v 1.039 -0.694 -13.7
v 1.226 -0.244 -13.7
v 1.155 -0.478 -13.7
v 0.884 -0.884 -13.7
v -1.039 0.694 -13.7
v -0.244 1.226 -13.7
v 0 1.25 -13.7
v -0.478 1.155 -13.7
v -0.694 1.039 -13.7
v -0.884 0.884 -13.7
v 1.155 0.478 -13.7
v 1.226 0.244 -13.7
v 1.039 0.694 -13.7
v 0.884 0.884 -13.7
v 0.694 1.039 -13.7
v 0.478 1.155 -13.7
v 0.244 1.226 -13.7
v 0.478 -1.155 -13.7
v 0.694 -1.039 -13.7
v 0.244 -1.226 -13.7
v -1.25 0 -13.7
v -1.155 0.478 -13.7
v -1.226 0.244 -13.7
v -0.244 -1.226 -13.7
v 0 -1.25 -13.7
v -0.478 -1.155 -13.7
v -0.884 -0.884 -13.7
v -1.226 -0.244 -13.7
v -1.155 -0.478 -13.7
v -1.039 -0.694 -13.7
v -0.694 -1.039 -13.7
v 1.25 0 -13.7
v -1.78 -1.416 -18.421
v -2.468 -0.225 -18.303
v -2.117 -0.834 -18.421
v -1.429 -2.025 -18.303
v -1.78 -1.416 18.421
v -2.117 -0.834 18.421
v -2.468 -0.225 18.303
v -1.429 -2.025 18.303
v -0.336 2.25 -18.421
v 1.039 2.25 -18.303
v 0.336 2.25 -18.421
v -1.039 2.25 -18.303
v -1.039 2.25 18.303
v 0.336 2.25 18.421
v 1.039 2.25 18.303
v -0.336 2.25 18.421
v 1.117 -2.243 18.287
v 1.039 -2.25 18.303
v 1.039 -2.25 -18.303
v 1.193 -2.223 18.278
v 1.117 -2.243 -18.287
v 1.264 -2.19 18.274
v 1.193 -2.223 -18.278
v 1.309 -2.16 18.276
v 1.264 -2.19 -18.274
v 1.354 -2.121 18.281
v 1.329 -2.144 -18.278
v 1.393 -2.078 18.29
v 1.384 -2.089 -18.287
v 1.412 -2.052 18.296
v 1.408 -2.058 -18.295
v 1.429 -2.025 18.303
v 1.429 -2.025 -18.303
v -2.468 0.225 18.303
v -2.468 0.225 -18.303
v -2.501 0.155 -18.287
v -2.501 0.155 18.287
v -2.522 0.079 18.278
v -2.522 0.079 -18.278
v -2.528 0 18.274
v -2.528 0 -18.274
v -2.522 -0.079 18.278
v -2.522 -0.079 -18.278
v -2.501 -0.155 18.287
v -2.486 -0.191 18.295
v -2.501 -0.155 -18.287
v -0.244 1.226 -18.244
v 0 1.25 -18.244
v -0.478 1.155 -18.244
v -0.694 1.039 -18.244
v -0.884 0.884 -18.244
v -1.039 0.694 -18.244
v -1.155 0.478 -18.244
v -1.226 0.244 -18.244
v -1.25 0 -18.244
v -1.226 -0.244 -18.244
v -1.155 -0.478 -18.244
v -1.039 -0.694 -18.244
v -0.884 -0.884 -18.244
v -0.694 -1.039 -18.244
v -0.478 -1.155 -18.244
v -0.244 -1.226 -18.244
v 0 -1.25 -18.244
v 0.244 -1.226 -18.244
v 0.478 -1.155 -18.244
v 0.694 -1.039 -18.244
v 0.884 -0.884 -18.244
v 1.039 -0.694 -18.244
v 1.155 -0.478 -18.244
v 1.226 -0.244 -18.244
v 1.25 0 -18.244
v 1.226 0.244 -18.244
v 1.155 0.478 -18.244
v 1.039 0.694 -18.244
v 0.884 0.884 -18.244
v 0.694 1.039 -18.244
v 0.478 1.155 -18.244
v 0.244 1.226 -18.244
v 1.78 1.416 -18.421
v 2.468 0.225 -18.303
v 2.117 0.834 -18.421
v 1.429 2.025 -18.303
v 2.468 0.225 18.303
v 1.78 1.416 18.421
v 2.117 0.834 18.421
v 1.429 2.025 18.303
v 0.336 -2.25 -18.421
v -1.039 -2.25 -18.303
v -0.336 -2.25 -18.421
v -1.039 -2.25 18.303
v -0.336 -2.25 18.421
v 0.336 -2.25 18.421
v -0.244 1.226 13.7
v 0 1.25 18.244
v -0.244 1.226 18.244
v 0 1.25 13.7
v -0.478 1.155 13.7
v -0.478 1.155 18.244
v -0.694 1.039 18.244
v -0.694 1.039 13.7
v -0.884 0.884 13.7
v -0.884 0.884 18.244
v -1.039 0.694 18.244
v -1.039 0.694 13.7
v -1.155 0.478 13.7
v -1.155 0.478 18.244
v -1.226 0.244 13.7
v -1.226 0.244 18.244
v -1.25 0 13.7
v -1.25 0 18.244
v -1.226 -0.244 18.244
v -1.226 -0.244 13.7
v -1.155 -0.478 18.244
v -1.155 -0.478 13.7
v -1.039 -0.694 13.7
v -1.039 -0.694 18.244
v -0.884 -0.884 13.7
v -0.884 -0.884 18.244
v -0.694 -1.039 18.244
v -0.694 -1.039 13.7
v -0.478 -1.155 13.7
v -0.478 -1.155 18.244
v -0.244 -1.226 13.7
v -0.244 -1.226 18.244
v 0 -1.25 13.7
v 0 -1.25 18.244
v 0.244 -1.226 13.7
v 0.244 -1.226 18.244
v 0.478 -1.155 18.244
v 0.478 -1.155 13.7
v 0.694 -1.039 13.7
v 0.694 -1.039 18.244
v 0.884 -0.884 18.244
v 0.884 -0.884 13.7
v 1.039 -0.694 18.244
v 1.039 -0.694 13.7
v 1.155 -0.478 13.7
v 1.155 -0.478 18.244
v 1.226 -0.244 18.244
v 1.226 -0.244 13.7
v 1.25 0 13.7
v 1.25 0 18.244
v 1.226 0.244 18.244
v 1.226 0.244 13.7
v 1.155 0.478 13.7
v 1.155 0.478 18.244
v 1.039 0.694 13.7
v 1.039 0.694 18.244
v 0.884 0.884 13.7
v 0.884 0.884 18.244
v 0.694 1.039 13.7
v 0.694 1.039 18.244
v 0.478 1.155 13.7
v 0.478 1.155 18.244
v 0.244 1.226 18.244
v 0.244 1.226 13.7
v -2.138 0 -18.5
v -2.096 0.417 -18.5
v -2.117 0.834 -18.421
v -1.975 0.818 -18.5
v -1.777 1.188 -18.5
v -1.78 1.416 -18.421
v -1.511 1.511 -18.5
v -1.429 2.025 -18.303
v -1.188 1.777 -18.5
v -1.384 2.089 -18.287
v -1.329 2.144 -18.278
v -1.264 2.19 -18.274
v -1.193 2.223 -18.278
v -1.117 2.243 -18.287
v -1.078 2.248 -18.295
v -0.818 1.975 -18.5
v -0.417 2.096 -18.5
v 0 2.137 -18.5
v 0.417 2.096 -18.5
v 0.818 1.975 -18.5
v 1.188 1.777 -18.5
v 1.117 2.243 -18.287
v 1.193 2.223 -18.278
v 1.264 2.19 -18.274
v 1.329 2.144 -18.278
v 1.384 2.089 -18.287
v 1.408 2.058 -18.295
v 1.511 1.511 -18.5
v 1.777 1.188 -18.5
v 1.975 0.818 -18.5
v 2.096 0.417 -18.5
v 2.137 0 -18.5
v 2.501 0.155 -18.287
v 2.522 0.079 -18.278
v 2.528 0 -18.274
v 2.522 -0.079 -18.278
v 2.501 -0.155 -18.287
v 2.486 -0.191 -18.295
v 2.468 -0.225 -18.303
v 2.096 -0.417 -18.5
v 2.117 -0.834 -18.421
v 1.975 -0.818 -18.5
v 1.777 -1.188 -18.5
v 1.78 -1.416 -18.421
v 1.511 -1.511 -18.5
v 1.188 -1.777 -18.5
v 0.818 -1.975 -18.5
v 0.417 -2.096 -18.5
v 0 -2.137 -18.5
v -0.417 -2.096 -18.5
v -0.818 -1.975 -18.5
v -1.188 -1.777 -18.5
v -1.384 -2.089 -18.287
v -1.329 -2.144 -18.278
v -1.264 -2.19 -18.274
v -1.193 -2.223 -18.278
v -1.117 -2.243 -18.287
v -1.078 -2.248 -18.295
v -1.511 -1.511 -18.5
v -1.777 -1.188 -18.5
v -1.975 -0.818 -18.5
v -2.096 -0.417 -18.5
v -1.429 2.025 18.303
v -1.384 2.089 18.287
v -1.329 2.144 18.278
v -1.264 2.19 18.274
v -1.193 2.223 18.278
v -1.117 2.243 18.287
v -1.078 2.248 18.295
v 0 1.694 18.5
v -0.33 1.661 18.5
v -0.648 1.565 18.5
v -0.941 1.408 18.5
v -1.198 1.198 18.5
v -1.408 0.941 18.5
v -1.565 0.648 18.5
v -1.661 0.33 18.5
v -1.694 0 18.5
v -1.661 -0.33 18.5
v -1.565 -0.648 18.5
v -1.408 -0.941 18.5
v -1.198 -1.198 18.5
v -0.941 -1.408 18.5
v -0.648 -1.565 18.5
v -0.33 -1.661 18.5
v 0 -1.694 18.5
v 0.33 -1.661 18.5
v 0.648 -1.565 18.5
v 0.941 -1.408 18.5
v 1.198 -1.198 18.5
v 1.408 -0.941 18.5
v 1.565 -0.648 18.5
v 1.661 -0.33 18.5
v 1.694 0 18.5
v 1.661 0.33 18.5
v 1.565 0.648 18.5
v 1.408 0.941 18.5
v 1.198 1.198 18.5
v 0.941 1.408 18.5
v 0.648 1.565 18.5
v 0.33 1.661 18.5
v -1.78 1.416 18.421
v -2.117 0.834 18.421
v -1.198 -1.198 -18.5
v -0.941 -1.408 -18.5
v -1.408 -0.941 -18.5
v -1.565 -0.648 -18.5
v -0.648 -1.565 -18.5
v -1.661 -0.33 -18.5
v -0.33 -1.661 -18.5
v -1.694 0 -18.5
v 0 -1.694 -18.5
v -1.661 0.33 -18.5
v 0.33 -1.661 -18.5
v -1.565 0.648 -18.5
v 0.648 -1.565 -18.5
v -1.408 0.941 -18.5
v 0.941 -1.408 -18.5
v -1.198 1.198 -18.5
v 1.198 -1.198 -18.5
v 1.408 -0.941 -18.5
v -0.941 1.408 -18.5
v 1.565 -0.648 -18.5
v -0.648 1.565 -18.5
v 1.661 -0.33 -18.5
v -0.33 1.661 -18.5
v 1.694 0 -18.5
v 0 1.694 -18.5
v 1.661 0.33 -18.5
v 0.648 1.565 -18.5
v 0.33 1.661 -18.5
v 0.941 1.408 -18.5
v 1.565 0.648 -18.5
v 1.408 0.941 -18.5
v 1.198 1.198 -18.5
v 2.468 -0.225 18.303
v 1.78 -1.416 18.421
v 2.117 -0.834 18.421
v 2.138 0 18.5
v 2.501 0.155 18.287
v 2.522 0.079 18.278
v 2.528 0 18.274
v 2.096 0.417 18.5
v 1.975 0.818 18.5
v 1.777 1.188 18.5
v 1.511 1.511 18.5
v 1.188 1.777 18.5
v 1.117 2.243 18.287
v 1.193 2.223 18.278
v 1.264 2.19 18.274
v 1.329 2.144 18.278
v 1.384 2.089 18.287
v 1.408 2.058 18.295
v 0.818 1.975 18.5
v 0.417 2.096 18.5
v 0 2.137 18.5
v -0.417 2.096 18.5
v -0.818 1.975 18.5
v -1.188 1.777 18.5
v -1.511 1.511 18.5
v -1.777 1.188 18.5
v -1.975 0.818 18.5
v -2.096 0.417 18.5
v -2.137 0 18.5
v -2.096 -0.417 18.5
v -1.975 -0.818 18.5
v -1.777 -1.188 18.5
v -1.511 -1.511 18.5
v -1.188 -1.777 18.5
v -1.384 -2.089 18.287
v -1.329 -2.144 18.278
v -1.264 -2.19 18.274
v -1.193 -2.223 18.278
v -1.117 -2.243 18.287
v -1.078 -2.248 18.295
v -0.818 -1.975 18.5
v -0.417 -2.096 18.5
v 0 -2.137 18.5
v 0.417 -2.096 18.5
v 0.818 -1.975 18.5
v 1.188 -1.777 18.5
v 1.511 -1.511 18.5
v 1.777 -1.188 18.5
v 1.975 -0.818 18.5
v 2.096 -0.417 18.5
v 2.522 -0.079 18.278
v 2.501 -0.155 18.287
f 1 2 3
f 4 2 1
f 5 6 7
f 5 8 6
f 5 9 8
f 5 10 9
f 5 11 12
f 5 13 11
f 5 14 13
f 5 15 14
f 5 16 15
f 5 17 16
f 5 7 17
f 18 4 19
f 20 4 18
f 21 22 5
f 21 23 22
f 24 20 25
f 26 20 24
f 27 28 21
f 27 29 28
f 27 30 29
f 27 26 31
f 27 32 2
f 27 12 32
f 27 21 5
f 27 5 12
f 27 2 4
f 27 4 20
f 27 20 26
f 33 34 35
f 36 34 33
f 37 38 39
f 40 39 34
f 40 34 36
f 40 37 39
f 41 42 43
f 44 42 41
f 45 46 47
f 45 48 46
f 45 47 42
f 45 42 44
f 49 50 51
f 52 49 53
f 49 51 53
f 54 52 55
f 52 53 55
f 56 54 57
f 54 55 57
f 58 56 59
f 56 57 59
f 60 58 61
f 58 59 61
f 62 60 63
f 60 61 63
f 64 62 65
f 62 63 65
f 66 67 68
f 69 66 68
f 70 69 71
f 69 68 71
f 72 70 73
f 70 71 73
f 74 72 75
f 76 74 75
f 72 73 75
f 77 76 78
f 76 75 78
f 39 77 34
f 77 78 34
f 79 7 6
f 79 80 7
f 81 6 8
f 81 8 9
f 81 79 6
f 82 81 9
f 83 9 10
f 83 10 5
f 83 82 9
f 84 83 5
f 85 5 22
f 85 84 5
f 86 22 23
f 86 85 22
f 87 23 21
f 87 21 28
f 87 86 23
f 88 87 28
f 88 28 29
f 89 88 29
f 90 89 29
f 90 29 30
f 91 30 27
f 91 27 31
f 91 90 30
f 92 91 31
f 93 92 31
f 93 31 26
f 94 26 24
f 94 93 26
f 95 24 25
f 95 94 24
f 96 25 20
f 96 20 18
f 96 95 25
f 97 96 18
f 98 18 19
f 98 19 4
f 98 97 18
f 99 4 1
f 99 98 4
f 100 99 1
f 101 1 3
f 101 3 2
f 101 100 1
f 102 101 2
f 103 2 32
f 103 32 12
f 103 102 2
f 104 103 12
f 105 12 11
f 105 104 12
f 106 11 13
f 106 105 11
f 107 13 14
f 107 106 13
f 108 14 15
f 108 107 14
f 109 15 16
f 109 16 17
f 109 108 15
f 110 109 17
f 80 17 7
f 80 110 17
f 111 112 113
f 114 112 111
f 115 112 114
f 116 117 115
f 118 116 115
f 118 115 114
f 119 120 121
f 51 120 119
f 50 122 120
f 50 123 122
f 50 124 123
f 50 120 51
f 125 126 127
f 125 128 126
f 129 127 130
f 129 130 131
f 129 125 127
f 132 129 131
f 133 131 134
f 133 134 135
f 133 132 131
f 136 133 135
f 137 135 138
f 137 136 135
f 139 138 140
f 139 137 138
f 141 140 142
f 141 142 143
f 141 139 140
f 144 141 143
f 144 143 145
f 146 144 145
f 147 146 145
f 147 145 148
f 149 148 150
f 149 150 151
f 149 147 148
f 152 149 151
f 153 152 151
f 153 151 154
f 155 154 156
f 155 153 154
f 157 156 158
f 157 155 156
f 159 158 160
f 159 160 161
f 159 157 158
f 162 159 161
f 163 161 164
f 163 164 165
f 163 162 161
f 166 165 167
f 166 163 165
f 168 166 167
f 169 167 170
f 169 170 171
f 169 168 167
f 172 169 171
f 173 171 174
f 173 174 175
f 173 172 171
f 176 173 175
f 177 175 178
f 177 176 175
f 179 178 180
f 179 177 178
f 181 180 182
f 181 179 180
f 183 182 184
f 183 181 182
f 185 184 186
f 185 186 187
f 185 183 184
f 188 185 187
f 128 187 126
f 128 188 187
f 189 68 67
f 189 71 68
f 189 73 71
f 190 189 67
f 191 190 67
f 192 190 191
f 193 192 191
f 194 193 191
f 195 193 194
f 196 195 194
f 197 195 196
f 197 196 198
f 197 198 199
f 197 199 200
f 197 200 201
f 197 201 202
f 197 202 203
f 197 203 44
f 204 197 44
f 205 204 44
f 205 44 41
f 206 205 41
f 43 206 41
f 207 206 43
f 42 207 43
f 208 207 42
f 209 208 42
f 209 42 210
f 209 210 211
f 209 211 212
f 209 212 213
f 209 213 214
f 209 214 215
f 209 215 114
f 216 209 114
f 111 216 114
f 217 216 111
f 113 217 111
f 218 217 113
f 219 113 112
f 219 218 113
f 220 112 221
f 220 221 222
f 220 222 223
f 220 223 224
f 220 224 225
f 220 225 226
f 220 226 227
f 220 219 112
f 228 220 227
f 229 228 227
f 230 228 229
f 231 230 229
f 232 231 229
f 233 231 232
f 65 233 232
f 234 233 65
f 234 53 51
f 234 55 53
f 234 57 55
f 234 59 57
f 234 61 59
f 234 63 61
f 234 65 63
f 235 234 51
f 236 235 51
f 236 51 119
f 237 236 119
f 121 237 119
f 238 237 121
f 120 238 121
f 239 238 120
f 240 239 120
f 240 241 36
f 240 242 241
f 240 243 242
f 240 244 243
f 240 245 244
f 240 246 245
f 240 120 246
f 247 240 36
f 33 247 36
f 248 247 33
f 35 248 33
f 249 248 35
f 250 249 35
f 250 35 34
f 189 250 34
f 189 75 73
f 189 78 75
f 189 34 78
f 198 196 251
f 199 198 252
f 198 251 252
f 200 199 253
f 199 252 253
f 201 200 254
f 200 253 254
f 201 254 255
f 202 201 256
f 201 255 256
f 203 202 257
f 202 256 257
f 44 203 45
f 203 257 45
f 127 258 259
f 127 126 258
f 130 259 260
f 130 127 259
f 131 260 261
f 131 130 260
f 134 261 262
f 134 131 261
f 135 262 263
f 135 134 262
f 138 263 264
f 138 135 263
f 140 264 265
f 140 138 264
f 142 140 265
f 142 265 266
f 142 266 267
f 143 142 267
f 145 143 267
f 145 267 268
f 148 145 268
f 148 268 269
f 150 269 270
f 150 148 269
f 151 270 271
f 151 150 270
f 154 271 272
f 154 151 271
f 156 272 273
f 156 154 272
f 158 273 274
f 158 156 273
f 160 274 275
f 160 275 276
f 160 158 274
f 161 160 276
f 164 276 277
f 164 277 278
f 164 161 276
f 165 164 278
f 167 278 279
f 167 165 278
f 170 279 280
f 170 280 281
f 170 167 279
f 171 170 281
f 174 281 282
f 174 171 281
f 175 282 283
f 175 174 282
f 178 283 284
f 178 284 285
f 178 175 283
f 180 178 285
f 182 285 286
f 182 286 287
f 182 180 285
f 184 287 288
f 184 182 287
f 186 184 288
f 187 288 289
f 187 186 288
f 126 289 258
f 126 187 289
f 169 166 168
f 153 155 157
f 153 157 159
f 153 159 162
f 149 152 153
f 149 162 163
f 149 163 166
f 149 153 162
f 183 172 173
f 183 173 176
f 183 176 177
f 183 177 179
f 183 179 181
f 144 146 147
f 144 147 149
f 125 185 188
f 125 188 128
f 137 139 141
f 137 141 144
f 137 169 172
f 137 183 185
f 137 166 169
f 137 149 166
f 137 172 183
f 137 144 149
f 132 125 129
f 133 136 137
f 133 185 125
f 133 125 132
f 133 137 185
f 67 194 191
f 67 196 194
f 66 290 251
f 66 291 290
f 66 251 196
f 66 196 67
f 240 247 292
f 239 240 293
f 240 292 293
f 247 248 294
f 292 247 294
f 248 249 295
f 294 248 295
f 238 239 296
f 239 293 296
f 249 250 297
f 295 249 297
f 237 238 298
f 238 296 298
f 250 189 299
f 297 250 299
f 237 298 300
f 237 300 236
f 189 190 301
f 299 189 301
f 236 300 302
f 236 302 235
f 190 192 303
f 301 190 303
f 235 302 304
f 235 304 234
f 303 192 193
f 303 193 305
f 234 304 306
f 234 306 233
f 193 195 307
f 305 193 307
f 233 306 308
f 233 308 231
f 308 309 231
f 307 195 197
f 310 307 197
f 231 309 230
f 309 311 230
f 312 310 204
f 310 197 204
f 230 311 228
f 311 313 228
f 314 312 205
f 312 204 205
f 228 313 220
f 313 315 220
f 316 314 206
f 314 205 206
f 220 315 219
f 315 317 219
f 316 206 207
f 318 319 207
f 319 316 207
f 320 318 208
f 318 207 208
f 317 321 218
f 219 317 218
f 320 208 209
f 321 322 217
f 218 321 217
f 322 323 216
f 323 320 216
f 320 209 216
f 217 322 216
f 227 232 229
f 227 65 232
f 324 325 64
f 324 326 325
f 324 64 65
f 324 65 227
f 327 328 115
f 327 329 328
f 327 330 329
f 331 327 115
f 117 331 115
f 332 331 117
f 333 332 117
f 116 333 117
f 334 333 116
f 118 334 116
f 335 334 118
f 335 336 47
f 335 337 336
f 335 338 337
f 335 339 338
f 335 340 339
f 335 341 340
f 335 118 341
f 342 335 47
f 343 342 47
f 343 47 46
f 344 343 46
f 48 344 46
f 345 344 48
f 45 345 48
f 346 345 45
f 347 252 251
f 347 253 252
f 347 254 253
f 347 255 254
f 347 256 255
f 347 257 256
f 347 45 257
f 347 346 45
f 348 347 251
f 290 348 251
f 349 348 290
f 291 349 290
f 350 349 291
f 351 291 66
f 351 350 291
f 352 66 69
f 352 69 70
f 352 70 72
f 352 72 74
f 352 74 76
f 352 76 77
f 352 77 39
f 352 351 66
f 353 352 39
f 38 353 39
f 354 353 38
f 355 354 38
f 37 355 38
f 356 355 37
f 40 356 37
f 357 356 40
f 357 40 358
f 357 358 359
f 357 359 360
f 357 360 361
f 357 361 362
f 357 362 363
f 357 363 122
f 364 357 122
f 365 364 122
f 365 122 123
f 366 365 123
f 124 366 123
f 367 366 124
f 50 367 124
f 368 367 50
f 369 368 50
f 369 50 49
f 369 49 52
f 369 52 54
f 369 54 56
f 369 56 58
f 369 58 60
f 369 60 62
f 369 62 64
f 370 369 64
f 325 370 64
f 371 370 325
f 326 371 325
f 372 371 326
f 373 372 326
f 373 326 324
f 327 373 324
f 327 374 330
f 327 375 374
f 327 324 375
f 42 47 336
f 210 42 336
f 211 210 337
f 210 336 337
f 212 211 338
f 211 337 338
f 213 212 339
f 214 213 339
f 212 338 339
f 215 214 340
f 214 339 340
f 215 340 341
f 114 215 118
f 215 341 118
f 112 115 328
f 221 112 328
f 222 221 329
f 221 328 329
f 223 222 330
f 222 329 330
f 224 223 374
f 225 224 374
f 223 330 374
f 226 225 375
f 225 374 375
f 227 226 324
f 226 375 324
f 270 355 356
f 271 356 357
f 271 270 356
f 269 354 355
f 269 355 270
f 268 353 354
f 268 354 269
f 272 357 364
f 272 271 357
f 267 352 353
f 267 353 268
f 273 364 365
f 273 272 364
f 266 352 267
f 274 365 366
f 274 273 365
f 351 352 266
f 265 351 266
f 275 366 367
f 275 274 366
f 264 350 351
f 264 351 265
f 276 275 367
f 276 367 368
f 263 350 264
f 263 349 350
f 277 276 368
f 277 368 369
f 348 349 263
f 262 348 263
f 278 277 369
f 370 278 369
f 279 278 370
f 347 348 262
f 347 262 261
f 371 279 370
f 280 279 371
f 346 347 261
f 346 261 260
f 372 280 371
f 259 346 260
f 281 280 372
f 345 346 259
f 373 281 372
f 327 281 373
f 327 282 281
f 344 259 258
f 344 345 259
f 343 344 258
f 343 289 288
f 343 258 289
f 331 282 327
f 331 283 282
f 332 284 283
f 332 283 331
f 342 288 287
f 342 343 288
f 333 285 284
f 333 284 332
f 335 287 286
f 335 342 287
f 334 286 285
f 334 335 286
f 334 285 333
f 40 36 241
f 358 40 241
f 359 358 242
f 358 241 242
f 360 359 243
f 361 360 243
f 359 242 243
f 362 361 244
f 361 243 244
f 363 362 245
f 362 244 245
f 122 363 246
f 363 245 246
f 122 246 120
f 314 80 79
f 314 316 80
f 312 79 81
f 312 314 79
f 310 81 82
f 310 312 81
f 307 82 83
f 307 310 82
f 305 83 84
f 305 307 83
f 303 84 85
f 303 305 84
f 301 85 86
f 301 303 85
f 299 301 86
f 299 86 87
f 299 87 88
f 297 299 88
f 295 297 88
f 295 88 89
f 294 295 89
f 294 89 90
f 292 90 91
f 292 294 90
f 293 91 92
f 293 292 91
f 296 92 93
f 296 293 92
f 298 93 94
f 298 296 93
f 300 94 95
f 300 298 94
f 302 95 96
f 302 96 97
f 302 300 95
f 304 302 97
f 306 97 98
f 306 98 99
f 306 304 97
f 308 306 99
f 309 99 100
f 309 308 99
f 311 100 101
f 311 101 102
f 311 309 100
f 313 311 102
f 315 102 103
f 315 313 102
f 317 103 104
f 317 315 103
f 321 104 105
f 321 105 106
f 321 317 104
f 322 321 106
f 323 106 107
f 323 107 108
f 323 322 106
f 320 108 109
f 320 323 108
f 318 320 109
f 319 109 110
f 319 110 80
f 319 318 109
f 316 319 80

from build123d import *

# Parameters (mm, degrees)
SKETCH4_R           = 1.75
BOSS_EXTRUDE1_DEPTH = 18.5
SKETCH5_OUTSIDE_W   = 146.91
SKETCH5_OUTSIDE_H   = 146.214
SKETCH5_OUTSIDE_R   = 2.1375
CUT_EXTRUDE1_DEPTH  = 38.159285515
CUT_EXTRUDE1_DRAFT  = -60
SKETCH6_OUTSIDE_W   = 146.91
SKETCH6_OUTSIDE_H   = 146.214
SKETCH6_OUTSIDE_R   = 2.1375
CUT_EXTRUDE2_DEPTH  = 38.159285515
CUT_EXTRUDE2_DRAFT  = -60
FILLET1_R           = 0.45


with BuildPart() as part:
    # Sketch3 → Revolve1 (revolve)
    with BuildSketch(Plane(origin=(0, 0, 0), x_dir=(0, 0, -1), z_dir=(1, 0, 0))):
        Polygon((-18.243800818, 1.25), (-13.7, 1.25), (-13.7, 0), (13.7, 0), (13.7, 1.25), (18.243800818, 1.25), (18.5, 1.69375), (18.5, 2.25), (0, 2.25), (-18.5, 2.25), (-18.5, 1.69375), align=None)
        Polygon((-18.243800818, 1.25), (-13.7, 1.25), (-13.7, 0), (13.7, 0), (13.7, 1.25), (18.243800818, 1.25), (18.5, 1.69375), (18.5, 2.25), (0, 2.25), (-18.5, 2.25), (-18.5, 1.69375), align=None)
    revolve(axis=Axis((0, 0, 13.7), (0, 0, 1)))

    # Sketch4 → Boss-Extrude1 (add, symmetric)
    with BuildSketch(Plane.XY):
        Polygon((-1.299038106, 2.25), (-2.598076211, 0), (-1.299038106, -2.25), (1.299038106, -2.25), (2.598076211, 0), (1.299038106, 2.25), align=None)
        Circle(SKETCH4_R, mode=Mode.SUBTRACT)
    extrude(amount=BOSS_EXTRUDE1_DEPTH, both=True)


with BuildPart() as cut_extrude1_tool:
    # Sketch5 outside → Cut-Extrude1 (with draft: the straight prism first)
    with BuildSketch(Plane.XY.offset(18.5)):
        Rectangle(SKETCH5_OUTSIDE_W, SKETCH5_OUTSIDE_H)
        Circle(SKETCH5_OUTSIDE_R, mode=Mode.SUBTRACT)
    extrude(amount=-CUT_EXTRUDE1_DEPTH)
    # Cut-Extrude1: the draft: its side faces are tilted about the plane it starts from
    cut_extrude1_sides = [cut_extrude1_tool.faces().sort_by_distance(p)[0] for p in [
        (0, -73.107, -0.579642758),
        (73.455, 0, -0.579642758),
        (0, 73.107, -0.579642758),
        (-73.455, 0, -0.579642758),
        (-2.1375, 0, -0.579642758),
    ]]
    draft(cut_extrude1_sides, Plane.XY.offset(18.5), CUT_EXTRUDE1_DRAFT)


with BuildPart() as part_1:
    add(part.part)

    # Cut-Extrude1: cut by cut_extrude1_tool
    add(cut_extrude1_tool.part, mode=Mode.SUBTRACT)


with BuildPart() as cut_extrude2_tool:
    # Sketch6 outside → Cut-Extrude2 (with draft: the straight prism first)
    with BuildSketch(Plane(origin=(0, 0, -18.5), x_dir=(-1, 0, 0), z_dir=(0, 0, -1))):
        Rectangle(SKETCH6_OUTSIDE_W, SKETCH6_OUTSIDE_H)
        Circle(SKETCH6_OUTSIDE_R, mode=Mode.SUBTRACT)
    extrude(amount=-CUT_EXTRUDE2_DEPTH)
    # Cut-Extrude2: the draft: its side faces are tilted about the plane it starts from
    cut_extrude2_sides = [cut_extrude2_tool.faces().sort_by_distance(p)[0] for p in [
        (0, -73.107, 0.579642758),
        (-73.455, 0, 0.579642758),
        (0, 73.107, 0.579642758),
        (73.455, 0, 0.579642758),
        (2.1375, 0, 0.579642758),
    ]]
    draft(cut_extrude2_sides, Plane(origin=(0, 0, -18.5), x_dir=(-1, 0, 0), z_dir=(0, 0, -1)), CUT_EXTRUDE2_DRAFT)


with BuildPart() as part_2:
    add(part_1.part)

    # Cut-Extrude2: cut by cut_extrude2_tool
    add(cut_extrude2_tool.part, mode=Mode.SUBTRACT)

    # Fillet1
    # the kernel refuses this fillet: 0.45 mm, written as the material it takes off along each edge
    with BuildSketch(Plane(origin=(1.299038106, 2.25, 18.883605253), x_dir=(-1, 0, 0), z_dir=(0, 0, -1)), Plane(origin=(-1.299038106, 2.25, 18.883605253), x_dir=(-0.49999999999999967, -0.8660254037844387, 0), z_dir=(0, 0, -1))) as fillet1_piece_1:
        with BuildLine():
            CenterArc((FILLET1_R * 0.57735026919, -FILLET1_R), FILLET1_R, 90, 60)
            Line((-FILLET1_R * 0.288675134595, -FILLET1_R * 0.5), (0, 0))
            Line((0, 0), (FILLET1_R * 0.57735026919, 0))
        make_face()
    extrude(amount=37.767210506, mode=Mode.SUBTRACT)
    with BuildSketch(Plane(origin=(-2.598076211, 0, -18.883605253), x_dir=(0.5000000000000006, -0.8660254037844384, 0), z_dir=(0, 0, 1)), Plane(origin=(-1.299038106, -2.25, -18.883605253), x_dir=(1, 0, 0), z_dir=(0, 0, 1)), Plane(origin=(1.299038106, -2.25, -18.883605253), x_dir=(0.49999999999999967, 0.8660254037844387, 0), z_dir=(0, 0, 1)), Plane(origin=(2.598076211, 0, 18.883605253), x_dir=(-0.5, -0.8660254037844388, 0), z_dir=(0, 0, -1))) as fillet1_piece_2:
        with BuildLine():
            CenterArc((FILLET1_R * 0.57735026919, FILLET1_R), FILLET1_R, 210, 60)
            Line((-FILLET1_R * 0.288675134595, FILLET1_R * 0.5), (0, 0))
            Line((0, 0), (FILLET1_R * 0.57735026919, 0))
        make_face()
    extrude(amount=37.767210506, mode=Mode.SUBTRACT)


solid = part_2.part
